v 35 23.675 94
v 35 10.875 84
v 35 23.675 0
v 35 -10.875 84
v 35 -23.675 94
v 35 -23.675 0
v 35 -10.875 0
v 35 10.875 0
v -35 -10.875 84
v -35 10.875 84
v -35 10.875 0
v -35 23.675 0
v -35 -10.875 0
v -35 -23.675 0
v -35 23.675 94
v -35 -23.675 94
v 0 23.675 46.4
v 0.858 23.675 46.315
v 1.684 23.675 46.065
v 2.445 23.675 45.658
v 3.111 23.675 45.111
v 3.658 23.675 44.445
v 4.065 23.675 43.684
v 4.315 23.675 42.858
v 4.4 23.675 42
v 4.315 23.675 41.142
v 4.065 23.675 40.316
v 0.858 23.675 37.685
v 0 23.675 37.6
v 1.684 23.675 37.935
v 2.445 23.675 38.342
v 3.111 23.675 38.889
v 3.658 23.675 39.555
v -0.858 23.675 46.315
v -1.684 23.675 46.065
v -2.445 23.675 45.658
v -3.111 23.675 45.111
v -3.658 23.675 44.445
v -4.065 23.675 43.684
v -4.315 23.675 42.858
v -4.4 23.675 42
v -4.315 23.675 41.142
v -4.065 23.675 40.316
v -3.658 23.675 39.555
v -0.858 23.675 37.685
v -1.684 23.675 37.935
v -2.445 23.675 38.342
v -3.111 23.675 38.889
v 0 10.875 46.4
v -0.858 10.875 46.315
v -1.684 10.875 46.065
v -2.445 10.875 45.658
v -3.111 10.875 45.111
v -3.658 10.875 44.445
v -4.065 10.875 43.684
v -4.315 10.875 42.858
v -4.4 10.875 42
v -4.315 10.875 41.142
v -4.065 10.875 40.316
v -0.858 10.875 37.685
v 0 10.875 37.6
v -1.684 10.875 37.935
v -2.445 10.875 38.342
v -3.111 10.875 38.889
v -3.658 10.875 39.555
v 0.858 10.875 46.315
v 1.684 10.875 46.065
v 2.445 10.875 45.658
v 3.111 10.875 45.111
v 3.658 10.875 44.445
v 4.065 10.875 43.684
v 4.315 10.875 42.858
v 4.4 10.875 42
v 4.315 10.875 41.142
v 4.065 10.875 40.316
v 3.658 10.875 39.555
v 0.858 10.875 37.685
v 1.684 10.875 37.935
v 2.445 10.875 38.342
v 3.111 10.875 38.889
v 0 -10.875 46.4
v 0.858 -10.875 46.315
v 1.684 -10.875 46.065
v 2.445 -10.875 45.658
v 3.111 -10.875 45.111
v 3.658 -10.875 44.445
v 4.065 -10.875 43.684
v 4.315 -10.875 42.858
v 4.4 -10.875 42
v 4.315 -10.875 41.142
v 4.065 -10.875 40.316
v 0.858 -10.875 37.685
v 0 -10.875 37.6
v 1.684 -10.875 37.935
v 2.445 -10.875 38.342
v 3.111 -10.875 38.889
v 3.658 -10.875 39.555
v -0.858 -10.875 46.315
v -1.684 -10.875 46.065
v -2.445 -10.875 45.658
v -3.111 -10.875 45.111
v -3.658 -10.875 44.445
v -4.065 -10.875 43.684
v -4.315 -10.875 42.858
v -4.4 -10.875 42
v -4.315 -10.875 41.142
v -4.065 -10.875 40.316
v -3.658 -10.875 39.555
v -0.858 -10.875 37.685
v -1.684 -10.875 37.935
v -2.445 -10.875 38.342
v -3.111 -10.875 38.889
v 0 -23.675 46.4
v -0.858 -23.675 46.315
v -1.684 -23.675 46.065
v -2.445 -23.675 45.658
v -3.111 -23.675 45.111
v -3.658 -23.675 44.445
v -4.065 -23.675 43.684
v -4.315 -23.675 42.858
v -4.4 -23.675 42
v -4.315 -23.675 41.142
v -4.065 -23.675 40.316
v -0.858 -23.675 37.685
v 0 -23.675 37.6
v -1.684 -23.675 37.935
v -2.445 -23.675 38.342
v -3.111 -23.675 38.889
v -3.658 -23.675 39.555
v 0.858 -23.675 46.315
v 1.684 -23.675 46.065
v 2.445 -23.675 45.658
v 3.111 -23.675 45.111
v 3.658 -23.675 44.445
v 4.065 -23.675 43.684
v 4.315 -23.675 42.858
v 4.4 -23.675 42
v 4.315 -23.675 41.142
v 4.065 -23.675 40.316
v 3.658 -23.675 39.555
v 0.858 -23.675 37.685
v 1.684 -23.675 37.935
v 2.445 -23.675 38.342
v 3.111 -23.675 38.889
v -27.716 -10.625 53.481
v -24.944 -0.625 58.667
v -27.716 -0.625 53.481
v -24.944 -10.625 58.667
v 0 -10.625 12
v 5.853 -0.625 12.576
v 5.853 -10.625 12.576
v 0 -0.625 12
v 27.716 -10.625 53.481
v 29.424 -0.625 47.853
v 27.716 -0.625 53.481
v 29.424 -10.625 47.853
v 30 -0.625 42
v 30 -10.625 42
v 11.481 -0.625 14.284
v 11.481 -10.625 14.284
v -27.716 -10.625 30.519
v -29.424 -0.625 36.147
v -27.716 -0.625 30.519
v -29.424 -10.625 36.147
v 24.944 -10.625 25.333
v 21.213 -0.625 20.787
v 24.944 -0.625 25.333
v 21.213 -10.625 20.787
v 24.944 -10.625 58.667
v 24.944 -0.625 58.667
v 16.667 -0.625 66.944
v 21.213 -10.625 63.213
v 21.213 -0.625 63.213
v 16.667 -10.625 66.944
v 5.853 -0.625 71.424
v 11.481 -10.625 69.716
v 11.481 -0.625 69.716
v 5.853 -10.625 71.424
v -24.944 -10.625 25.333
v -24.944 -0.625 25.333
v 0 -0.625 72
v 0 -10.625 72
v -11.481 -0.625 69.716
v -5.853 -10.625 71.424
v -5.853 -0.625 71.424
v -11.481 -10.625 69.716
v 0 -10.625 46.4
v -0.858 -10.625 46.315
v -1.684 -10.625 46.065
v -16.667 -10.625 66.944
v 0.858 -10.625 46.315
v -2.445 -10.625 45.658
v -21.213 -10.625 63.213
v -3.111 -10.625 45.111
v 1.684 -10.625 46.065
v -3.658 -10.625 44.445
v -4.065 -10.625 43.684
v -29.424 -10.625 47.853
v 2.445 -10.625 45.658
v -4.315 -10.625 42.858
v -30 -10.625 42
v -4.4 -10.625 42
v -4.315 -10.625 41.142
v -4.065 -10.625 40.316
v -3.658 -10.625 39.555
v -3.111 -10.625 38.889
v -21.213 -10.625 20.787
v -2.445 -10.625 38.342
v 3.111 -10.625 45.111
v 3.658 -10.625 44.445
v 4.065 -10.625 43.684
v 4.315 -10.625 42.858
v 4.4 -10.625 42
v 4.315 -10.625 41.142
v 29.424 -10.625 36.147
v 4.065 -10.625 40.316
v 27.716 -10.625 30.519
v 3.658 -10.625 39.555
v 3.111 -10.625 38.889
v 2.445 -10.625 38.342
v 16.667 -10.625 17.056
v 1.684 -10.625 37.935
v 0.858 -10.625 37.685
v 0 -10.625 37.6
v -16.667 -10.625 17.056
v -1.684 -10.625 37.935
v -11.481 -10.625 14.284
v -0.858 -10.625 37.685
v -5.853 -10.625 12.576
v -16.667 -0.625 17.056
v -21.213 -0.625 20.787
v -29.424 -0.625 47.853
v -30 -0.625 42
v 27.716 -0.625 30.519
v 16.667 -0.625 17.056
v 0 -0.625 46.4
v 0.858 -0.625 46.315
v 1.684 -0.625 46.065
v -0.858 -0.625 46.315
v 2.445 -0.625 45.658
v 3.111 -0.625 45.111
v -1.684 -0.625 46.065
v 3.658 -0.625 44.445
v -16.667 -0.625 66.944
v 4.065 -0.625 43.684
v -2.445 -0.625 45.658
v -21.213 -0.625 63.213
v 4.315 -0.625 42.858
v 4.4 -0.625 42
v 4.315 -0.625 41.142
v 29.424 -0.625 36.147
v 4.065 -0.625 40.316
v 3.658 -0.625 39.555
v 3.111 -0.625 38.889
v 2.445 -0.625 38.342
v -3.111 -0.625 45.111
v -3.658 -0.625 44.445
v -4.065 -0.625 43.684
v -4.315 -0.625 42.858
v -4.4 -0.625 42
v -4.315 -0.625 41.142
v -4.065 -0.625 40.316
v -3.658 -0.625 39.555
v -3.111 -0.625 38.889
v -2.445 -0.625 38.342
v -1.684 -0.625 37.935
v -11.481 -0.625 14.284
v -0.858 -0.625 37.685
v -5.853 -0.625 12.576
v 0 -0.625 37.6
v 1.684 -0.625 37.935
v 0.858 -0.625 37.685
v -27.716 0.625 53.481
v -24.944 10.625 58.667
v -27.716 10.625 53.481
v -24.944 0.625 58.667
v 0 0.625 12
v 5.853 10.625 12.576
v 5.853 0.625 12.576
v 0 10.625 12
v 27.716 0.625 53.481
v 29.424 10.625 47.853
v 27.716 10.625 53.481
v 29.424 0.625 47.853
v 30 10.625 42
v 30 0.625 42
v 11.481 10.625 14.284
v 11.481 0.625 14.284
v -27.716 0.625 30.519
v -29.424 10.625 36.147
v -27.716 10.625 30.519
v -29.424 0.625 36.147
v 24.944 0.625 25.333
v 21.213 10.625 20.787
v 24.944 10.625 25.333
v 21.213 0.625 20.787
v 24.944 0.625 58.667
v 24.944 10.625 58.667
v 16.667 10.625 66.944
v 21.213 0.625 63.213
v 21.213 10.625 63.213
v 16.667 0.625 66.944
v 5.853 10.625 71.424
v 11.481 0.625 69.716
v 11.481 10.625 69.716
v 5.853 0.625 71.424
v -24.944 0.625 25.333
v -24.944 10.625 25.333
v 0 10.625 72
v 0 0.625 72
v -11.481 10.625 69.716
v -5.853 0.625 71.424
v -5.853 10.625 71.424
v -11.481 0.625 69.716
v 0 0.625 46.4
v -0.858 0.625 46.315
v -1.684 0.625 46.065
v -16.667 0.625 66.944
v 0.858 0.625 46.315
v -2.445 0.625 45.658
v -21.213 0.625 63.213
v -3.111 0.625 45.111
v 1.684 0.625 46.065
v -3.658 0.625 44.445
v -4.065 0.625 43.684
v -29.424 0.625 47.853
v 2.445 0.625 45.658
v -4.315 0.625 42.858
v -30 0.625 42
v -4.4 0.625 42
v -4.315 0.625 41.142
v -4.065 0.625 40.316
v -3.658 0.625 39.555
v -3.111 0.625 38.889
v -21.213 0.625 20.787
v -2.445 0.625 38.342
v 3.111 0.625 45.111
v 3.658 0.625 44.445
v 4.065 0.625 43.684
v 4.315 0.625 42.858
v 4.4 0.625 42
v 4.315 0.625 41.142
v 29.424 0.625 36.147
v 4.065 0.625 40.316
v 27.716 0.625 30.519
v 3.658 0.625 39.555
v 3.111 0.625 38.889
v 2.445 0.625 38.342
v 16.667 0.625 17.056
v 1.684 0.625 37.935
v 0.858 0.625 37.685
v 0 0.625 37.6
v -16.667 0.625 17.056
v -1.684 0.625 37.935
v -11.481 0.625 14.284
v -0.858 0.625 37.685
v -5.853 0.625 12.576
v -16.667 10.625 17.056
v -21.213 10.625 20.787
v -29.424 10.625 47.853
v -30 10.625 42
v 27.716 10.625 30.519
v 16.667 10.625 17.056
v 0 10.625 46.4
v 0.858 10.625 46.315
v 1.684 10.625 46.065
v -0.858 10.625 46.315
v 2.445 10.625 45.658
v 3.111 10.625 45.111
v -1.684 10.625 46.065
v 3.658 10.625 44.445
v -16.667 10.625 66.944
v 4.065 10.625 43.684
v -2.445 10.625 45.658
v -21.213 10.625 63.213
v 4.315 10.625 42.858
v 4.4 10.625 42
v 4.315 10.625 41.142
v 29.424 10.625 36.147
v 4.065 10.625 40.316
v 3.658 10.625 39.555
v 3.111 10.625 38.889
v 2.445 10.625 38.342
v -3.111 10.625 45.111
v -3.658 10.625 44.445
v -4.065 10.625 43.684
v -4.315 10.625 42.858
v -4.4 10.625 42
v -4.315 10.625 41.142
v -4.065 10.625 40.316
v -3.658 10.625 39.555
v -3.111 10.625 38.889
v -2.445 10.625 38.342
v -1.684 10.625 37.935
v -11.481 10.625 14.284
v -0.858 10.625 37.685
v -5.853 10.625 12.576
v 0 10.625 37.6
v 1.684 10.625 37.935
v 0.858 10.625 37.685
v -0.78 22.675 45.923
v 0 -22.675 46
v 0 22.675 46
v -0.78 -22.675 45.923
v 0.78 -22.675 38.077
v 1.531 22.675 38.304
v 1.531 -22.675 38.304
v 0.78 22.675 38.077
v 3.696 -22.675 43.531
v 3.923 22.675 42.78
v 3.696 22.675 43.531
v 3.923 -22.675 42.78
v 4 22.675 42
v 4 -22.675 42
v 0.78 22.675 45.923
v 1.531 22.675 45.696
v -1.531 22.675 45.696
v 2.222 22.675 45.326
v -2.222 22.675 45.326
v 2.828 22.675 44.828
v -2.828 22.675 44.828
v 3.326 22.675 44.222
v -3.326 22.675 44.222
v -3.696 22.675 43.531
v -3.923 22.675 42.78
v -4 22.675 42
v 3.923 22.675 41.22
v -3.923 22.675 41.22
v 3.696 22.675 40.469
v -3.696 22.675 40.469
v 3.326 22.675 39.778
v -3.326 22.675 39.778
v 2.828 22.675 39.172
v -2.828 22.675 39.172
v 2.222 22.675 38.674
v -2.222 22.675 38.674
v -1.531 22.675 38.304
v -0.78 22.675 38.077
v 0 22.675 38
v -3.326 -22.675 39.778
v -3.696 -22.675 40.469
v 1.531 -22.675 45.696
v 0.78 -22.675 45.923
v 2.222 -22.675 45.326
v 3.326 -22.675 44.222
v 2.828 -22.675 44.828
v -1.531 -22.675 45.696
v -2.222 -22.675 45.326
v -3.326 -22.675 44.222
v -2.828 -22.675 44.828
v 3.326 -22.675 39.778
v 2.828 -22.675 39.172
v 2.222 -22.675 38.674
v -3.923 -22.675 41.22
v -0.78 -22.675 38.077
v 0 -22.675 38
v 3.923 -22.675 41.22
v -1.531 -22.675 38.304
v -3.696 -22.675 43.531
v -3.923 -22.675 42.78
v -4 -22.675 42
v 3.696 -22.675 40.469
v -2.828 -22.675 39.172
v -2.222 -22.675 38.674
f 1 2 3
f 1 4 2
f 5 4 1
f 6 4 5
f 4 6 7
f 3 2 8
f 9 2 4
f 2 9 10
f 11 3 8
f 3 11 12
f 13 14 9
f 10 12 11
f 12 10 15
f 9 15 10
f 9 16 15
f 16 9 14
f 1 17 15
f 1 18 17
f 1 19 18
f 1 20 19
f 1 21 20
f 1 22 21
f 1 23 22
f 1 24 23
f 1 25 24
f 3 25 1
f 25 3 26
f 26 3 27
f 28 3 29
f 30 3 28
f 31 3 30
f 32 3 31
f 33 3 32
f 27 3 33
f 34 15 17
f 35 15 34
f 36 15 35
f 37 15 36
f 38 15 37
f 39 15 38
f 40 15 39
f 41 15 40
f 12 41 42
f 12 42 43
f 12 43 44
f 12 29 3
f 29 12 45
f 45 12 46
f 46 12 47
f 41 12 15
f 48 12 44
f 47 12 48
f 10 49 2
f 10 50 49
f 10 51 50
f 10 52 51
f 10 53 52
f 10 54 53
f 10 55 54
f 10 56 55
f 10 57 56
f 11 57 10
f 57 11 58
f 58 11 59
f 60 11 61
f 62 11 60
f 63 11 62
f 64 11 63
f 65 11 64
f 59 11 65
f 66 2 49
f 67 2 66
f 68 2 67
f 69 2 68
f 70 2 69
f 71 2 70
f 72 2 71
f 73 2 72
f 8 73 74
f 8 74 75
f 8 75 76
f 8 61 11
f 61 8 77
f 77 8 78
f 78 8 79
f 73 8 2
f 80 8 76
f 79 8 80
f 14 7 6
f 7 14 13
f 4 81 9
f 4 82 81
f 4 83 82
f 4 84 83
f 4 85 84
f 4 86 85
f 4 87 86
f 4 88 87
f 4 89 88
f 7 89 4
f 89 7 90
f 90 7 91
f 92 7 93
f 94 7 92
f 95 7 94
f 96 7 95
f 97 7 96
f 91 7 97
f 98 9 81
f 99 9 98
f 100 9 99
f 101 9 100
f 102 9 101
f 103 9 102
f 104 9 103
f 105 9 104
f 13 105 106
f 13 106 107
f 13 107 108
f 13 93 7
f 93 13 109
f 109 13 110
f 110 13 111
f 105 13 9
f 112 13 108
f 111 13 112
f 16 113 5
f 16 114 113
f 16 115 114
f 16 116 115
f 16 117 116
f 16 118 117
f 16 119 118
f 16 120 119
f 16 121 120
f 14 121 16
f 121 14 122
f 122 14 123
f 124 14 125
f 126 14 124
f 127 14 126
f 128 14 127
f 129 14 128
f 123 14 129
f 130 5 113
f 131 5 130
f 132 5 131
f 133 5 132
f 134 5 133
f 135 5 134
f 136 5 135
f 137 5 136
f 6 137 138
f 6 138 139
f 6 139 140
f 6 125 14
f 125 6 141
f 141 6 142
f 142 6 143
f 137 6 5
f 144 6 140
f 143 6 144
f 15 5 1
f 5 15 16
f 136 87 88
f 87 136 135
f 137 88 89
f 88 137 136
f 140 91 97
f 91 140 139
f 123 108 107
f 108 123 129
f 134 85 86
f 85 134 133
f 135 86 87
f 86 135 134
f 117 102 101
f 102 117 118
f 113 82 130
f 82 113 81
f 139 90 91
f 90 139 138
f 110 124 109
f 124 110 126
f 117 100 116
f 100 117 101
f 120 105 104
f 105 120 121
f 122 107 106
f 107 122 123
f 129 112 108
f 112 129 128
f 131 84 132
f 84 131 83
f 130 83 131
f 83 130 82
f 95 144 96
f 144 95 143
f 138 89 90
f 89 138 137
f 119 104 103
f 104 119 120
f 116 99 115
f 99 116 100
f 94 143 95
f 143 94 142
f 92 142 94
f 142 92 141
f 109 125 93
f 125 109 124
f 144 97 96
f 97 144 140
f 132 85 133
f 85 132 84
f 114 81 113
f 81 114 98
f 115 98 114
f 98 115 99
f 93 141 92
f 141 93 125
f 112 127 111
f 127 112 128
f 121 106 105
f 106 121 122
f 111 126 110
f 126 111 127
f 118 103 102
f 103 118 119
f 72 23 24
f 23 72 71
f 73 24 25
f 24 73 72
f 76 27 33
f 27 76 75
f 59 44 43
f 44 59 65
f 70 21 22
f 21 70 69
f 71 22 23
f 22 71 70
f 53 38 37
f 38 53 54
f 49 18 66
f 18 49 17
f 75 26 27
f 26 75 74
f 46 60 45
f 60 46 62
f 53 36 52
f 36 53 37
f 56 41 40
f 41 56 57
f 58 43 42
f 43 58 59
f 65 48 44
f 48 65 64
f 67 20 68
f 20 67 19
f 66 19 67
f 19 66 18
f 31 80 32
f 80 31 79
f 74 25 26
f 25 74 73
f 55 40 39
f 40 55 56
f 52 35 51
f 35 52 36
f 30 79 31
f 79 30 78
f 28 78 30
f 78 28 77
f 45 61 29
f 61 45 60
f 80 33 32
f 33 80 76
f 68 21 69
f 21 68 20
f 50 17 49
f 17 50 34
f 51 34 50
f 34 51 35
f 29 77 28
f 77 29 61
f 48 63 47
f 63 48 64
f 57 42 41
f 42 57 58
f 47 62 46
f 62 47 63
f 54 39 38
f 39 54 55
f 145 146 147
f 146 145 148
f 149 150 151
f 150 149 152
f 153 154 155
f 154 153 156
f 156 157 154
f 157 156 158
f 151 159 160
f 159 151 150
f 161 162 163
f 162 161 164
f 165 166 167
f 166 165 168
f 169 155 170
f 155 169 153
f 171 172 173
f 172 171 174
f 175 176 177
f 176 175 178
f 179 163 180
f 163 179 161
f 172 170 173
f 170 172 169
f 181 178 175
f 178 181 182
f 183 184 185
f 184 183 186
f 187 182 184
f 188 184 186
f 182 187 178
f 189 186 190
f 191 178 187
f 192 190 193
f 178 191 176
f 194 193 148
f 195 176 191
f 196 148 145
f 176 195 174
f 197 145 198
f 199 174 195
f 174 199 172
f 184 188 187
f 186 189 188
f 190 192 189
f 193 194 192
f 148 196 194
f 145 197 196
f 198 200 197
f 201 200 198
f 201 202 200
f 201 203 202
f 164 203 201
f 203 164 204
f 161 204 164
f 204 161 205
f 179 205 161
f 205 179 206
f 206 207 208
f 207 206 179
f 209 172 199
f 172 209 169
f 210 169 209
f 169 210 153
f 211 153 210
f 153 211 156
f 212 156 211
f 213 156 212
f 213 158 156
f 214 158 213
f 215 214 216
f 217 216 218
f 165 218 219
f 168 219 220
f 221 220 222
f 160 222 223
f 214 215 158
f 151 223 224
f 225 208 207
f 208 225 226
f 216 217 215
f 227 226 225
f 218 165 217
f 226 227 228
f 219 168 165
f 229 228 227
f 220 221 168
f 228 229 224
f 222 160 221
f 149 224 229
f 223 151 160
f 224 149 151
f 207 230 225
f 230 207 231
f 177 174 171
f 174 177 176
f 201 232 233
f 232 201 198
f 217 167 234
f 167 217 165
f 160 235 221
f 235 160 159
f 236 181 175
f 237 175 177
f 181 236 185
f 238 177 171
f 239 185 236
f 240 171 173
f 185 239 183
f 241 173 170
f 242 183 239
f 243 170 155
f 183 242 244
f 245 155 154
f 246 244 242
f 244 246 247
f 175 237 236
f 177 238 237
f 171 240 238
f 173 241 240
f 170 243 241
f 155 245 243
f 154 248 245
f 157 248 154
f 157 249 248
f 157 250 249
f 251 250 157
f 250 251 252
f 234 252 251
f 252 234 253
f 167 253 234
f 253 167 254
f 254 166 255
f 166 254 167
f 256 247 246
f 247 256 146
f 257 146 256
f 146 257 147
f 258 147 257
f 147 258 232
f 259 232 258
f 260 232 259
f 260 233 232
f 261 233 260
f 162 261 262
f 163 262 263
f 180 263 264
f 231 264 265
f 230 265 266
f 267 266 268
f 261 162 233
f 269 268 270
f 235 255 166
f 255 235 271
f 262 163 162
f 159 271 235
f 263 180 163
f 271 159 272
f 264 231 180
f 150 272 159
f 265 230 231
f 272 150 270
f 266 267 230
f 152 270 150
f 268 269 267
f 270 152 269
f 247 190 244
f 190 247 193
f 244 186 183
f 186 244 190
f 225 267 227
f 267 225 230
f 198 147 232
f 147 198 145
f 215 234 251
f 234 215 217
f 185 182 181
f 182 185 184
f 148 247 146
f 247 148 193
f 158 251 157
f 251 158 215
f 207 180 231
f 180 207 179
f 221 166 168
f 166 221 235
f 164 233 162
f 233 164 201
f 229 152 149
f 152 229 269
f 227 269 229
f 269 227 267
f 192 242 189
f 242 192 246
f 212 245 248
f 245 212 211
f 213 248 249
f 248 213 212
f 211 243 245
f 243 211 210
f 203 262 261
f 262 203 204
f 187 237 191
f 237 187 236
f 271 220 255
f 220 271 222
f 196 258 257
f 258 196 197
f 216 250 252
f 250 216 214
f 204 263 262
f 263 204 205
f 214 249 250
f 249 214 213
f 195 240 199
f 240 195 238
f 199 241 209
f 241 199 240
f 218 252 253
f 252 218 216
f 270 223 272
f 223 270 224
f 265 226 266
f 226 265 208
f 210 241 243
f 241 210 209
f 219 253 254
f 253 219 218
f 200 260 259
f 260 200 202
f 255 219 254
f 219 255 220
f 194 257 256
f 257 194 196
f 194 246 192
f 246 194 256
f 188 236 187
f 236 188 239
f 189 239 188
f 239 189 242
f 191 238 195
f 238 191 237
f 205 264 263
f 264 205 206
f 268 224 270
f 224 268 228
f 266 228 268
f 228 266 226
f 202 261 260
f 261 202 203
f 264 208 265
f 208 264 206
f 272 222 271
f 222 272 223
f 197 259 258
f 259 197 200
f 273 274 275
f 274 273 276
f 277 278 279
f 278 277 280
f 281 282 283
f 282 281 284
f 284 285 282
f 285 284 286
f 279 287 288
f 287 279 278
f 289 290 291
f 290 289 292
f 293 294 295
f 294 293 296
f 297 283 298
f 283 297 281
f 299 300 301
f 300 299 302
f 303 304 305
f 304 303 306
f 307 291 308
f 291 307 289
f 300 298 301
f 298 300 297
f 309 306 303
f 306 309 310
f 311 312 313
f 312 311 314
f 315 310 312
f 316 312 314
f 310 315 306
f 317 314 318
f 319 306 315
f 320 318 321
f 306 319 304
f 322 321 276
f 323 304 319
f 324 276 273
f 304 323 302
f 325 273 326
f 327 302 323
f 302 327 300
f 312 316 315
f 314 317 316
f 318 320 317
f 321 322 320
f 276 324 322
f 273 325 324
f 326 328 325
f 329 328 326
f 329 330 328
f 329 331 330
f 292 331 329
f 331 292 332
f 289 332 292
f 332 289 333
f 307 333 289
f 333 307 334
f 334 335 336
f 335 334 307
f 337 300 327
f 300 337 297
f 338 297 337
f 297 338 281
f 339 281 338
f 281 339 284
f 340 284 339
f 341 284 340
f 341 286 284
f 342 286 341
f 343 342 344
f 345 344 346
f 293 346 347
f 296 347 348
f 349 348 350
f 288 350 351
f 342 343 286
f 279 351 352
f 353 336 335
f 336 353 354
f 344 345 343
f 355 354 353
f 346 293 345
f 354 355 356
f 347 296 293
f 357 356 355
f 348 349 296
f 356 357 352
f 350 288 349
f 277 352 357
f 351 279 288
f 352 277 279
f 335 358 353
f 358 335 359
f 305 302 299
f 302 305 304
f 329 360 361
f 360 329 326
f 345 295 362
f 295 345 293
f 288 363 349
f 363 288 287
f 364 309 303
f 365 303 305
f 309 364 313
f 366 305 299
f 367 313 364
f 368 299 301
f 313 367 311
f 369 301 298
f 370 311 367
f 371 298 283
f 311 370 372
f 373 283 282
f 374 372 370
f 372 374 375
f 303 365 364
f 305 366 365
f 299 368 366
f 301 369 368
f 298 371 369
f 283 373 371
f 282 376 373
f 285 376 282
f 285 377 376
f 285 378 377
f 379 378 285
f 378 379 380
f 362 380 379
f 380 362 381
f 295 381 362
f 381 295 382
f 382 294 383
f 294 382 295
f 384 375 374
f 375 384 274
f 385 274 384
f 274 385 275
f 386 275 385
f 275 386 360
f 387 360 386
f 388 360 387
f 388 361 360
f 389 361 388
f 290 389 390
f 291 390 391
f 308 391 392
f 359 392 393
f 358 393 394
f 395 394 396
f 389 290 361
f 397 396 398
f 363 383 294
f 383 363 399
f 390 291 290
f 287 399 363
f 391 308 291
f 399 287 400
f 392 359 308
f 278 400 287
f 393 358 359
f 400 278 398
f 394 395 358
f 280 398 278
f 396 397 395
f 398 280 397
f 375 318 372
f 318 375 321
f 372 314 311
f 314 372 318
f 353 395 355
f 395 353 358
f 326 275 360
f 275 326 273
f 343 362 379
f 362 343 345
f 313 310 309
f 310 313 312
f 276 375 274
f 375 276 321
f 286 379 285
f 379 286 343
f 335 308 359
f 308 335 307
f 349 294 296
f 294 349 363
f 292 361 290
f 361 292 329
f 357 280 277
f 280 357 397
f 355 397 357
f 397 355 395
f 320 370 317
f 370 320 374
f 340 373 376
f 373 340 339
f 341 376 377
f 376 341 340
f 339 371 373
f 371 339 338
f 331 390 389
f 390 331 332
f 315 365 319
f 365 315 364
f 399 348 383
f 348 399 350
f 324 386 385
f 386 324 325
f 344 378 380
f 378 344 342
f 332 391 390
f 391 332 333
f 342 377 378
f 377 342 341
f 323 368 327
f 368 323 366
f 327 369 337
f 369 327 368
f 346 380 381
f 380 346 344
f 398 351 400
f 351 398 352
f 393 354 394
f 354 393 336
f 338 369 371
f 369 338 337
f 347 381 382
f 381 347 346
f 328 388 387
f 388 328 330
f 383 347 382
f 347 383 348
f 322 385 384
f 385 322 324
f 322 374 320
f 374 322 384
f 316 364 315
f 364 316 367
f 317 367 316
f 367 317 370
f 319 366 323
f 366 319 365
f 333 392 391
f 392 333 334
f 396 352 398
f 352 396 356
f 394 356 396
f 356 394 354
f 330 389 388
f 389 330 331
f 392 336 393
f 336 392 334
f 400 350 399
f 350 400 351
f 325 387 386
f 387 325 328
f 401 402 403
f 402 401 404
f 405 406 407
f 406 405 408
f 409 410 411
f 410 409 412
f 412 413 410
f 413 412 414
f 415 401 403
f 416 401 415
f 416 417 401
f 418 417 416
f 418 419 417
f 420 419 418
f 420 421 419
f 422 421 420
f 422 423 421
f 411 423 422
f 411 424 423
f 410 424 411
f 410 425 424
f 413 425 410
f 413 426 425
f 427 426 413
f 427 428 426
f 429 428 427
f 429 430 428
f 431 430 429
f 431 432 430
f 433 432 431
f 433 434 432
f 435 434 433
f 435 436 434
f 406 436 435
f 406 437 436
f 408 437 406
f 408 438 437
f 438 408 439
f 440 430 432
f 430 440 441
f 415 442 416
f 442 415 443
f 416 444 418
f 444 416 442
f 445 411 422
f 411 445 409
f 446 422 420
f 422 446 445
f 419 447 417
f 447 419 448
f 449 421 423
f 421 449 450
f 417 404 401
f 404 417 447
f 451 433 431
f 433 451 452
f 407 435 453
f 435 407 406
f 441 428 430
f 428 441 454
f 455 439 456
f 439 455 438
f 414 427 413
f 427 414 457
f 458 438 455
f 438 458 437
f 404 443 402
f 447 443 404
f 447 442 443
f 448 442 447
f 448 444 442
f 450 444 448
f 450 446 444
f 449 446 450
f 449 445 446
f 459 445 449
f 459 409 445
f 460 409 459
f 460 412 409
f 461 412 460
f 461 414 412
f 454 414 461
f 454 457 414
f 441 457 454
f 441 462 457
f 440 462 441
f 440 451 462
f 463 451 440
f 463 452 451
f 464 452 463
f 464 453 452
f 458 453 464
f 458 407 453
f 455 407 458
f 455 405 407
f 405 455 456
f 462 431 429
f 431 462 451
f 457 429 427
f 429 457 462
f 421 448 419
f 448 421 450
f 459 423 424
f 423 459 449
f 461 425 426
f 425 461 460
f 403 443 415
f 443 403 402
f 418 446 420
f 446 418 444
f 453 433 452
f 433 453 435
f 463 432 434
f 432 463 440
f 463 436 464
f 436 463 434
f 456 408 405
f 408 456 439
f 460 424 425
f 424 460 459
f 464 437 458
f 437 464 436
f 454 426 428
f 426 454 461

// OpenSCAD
$fn = 32;

// ------------------------------------------------------------------------
// Trolley wheel set: wheels d60, fork 84 mm tall
// Every part is its own module, assembly() places every instance.
// ------------------------------------------------------------------------

// --- part 1 ---
module trolley_fork() {
  difference() {
    union() {
      translate([-35, 10.875, 0]) cube([70, 12.8, 84]);
      translate([-35, -23.675, 0]) cube([70, 12.8, 84]);
      translate([-35, -23.675, 84]) cube([70, 47.35, 10]);
    }
    translate([0, -17.275, 42]) rotate([90, 0, 0]) cylinder(h = 14.8, d = 8.8, center = true);
    translate([0, 17.275, 42]) rotate([90, 0, 0]) cylinder(h = 14.8, d = 8.8, center = true);
  }
}

// --- part 2 ---
module trolley_wheel() {
  difference() {
      translate([0, 0, 0]) cylinder(h = 10, d = 60);
      translate([0, 0, -1]) cylinder(h = 12, d = 8.8);
    }
}

// --- part 3 ---
module trolley_axle() {
  translate([0, 0, -22.675]) cylinder(h = 45.35, d = 8);
}

// --- assembly ---
module assembly() {
  color([0.80, 0.24, 0.20]) translate([0, 0, 0]) rotate([0, 0, 0]) trolley_fork();
  color([0.20, 0.45, 0.75]) translate([0, -0.625, 42]) rotate([90, 0, 0]) trolley_wheel();
  color([0.25, 0.62, 0.32]) translate([0, 10.625, 42]) rotate([90, 0, 0]) trolley_wheel();
  color([0.92, 0.70, 0.18]) translate([0, 0, 42]) rotate([90, 0, 0]) trolley_axle();
}

assembly();
